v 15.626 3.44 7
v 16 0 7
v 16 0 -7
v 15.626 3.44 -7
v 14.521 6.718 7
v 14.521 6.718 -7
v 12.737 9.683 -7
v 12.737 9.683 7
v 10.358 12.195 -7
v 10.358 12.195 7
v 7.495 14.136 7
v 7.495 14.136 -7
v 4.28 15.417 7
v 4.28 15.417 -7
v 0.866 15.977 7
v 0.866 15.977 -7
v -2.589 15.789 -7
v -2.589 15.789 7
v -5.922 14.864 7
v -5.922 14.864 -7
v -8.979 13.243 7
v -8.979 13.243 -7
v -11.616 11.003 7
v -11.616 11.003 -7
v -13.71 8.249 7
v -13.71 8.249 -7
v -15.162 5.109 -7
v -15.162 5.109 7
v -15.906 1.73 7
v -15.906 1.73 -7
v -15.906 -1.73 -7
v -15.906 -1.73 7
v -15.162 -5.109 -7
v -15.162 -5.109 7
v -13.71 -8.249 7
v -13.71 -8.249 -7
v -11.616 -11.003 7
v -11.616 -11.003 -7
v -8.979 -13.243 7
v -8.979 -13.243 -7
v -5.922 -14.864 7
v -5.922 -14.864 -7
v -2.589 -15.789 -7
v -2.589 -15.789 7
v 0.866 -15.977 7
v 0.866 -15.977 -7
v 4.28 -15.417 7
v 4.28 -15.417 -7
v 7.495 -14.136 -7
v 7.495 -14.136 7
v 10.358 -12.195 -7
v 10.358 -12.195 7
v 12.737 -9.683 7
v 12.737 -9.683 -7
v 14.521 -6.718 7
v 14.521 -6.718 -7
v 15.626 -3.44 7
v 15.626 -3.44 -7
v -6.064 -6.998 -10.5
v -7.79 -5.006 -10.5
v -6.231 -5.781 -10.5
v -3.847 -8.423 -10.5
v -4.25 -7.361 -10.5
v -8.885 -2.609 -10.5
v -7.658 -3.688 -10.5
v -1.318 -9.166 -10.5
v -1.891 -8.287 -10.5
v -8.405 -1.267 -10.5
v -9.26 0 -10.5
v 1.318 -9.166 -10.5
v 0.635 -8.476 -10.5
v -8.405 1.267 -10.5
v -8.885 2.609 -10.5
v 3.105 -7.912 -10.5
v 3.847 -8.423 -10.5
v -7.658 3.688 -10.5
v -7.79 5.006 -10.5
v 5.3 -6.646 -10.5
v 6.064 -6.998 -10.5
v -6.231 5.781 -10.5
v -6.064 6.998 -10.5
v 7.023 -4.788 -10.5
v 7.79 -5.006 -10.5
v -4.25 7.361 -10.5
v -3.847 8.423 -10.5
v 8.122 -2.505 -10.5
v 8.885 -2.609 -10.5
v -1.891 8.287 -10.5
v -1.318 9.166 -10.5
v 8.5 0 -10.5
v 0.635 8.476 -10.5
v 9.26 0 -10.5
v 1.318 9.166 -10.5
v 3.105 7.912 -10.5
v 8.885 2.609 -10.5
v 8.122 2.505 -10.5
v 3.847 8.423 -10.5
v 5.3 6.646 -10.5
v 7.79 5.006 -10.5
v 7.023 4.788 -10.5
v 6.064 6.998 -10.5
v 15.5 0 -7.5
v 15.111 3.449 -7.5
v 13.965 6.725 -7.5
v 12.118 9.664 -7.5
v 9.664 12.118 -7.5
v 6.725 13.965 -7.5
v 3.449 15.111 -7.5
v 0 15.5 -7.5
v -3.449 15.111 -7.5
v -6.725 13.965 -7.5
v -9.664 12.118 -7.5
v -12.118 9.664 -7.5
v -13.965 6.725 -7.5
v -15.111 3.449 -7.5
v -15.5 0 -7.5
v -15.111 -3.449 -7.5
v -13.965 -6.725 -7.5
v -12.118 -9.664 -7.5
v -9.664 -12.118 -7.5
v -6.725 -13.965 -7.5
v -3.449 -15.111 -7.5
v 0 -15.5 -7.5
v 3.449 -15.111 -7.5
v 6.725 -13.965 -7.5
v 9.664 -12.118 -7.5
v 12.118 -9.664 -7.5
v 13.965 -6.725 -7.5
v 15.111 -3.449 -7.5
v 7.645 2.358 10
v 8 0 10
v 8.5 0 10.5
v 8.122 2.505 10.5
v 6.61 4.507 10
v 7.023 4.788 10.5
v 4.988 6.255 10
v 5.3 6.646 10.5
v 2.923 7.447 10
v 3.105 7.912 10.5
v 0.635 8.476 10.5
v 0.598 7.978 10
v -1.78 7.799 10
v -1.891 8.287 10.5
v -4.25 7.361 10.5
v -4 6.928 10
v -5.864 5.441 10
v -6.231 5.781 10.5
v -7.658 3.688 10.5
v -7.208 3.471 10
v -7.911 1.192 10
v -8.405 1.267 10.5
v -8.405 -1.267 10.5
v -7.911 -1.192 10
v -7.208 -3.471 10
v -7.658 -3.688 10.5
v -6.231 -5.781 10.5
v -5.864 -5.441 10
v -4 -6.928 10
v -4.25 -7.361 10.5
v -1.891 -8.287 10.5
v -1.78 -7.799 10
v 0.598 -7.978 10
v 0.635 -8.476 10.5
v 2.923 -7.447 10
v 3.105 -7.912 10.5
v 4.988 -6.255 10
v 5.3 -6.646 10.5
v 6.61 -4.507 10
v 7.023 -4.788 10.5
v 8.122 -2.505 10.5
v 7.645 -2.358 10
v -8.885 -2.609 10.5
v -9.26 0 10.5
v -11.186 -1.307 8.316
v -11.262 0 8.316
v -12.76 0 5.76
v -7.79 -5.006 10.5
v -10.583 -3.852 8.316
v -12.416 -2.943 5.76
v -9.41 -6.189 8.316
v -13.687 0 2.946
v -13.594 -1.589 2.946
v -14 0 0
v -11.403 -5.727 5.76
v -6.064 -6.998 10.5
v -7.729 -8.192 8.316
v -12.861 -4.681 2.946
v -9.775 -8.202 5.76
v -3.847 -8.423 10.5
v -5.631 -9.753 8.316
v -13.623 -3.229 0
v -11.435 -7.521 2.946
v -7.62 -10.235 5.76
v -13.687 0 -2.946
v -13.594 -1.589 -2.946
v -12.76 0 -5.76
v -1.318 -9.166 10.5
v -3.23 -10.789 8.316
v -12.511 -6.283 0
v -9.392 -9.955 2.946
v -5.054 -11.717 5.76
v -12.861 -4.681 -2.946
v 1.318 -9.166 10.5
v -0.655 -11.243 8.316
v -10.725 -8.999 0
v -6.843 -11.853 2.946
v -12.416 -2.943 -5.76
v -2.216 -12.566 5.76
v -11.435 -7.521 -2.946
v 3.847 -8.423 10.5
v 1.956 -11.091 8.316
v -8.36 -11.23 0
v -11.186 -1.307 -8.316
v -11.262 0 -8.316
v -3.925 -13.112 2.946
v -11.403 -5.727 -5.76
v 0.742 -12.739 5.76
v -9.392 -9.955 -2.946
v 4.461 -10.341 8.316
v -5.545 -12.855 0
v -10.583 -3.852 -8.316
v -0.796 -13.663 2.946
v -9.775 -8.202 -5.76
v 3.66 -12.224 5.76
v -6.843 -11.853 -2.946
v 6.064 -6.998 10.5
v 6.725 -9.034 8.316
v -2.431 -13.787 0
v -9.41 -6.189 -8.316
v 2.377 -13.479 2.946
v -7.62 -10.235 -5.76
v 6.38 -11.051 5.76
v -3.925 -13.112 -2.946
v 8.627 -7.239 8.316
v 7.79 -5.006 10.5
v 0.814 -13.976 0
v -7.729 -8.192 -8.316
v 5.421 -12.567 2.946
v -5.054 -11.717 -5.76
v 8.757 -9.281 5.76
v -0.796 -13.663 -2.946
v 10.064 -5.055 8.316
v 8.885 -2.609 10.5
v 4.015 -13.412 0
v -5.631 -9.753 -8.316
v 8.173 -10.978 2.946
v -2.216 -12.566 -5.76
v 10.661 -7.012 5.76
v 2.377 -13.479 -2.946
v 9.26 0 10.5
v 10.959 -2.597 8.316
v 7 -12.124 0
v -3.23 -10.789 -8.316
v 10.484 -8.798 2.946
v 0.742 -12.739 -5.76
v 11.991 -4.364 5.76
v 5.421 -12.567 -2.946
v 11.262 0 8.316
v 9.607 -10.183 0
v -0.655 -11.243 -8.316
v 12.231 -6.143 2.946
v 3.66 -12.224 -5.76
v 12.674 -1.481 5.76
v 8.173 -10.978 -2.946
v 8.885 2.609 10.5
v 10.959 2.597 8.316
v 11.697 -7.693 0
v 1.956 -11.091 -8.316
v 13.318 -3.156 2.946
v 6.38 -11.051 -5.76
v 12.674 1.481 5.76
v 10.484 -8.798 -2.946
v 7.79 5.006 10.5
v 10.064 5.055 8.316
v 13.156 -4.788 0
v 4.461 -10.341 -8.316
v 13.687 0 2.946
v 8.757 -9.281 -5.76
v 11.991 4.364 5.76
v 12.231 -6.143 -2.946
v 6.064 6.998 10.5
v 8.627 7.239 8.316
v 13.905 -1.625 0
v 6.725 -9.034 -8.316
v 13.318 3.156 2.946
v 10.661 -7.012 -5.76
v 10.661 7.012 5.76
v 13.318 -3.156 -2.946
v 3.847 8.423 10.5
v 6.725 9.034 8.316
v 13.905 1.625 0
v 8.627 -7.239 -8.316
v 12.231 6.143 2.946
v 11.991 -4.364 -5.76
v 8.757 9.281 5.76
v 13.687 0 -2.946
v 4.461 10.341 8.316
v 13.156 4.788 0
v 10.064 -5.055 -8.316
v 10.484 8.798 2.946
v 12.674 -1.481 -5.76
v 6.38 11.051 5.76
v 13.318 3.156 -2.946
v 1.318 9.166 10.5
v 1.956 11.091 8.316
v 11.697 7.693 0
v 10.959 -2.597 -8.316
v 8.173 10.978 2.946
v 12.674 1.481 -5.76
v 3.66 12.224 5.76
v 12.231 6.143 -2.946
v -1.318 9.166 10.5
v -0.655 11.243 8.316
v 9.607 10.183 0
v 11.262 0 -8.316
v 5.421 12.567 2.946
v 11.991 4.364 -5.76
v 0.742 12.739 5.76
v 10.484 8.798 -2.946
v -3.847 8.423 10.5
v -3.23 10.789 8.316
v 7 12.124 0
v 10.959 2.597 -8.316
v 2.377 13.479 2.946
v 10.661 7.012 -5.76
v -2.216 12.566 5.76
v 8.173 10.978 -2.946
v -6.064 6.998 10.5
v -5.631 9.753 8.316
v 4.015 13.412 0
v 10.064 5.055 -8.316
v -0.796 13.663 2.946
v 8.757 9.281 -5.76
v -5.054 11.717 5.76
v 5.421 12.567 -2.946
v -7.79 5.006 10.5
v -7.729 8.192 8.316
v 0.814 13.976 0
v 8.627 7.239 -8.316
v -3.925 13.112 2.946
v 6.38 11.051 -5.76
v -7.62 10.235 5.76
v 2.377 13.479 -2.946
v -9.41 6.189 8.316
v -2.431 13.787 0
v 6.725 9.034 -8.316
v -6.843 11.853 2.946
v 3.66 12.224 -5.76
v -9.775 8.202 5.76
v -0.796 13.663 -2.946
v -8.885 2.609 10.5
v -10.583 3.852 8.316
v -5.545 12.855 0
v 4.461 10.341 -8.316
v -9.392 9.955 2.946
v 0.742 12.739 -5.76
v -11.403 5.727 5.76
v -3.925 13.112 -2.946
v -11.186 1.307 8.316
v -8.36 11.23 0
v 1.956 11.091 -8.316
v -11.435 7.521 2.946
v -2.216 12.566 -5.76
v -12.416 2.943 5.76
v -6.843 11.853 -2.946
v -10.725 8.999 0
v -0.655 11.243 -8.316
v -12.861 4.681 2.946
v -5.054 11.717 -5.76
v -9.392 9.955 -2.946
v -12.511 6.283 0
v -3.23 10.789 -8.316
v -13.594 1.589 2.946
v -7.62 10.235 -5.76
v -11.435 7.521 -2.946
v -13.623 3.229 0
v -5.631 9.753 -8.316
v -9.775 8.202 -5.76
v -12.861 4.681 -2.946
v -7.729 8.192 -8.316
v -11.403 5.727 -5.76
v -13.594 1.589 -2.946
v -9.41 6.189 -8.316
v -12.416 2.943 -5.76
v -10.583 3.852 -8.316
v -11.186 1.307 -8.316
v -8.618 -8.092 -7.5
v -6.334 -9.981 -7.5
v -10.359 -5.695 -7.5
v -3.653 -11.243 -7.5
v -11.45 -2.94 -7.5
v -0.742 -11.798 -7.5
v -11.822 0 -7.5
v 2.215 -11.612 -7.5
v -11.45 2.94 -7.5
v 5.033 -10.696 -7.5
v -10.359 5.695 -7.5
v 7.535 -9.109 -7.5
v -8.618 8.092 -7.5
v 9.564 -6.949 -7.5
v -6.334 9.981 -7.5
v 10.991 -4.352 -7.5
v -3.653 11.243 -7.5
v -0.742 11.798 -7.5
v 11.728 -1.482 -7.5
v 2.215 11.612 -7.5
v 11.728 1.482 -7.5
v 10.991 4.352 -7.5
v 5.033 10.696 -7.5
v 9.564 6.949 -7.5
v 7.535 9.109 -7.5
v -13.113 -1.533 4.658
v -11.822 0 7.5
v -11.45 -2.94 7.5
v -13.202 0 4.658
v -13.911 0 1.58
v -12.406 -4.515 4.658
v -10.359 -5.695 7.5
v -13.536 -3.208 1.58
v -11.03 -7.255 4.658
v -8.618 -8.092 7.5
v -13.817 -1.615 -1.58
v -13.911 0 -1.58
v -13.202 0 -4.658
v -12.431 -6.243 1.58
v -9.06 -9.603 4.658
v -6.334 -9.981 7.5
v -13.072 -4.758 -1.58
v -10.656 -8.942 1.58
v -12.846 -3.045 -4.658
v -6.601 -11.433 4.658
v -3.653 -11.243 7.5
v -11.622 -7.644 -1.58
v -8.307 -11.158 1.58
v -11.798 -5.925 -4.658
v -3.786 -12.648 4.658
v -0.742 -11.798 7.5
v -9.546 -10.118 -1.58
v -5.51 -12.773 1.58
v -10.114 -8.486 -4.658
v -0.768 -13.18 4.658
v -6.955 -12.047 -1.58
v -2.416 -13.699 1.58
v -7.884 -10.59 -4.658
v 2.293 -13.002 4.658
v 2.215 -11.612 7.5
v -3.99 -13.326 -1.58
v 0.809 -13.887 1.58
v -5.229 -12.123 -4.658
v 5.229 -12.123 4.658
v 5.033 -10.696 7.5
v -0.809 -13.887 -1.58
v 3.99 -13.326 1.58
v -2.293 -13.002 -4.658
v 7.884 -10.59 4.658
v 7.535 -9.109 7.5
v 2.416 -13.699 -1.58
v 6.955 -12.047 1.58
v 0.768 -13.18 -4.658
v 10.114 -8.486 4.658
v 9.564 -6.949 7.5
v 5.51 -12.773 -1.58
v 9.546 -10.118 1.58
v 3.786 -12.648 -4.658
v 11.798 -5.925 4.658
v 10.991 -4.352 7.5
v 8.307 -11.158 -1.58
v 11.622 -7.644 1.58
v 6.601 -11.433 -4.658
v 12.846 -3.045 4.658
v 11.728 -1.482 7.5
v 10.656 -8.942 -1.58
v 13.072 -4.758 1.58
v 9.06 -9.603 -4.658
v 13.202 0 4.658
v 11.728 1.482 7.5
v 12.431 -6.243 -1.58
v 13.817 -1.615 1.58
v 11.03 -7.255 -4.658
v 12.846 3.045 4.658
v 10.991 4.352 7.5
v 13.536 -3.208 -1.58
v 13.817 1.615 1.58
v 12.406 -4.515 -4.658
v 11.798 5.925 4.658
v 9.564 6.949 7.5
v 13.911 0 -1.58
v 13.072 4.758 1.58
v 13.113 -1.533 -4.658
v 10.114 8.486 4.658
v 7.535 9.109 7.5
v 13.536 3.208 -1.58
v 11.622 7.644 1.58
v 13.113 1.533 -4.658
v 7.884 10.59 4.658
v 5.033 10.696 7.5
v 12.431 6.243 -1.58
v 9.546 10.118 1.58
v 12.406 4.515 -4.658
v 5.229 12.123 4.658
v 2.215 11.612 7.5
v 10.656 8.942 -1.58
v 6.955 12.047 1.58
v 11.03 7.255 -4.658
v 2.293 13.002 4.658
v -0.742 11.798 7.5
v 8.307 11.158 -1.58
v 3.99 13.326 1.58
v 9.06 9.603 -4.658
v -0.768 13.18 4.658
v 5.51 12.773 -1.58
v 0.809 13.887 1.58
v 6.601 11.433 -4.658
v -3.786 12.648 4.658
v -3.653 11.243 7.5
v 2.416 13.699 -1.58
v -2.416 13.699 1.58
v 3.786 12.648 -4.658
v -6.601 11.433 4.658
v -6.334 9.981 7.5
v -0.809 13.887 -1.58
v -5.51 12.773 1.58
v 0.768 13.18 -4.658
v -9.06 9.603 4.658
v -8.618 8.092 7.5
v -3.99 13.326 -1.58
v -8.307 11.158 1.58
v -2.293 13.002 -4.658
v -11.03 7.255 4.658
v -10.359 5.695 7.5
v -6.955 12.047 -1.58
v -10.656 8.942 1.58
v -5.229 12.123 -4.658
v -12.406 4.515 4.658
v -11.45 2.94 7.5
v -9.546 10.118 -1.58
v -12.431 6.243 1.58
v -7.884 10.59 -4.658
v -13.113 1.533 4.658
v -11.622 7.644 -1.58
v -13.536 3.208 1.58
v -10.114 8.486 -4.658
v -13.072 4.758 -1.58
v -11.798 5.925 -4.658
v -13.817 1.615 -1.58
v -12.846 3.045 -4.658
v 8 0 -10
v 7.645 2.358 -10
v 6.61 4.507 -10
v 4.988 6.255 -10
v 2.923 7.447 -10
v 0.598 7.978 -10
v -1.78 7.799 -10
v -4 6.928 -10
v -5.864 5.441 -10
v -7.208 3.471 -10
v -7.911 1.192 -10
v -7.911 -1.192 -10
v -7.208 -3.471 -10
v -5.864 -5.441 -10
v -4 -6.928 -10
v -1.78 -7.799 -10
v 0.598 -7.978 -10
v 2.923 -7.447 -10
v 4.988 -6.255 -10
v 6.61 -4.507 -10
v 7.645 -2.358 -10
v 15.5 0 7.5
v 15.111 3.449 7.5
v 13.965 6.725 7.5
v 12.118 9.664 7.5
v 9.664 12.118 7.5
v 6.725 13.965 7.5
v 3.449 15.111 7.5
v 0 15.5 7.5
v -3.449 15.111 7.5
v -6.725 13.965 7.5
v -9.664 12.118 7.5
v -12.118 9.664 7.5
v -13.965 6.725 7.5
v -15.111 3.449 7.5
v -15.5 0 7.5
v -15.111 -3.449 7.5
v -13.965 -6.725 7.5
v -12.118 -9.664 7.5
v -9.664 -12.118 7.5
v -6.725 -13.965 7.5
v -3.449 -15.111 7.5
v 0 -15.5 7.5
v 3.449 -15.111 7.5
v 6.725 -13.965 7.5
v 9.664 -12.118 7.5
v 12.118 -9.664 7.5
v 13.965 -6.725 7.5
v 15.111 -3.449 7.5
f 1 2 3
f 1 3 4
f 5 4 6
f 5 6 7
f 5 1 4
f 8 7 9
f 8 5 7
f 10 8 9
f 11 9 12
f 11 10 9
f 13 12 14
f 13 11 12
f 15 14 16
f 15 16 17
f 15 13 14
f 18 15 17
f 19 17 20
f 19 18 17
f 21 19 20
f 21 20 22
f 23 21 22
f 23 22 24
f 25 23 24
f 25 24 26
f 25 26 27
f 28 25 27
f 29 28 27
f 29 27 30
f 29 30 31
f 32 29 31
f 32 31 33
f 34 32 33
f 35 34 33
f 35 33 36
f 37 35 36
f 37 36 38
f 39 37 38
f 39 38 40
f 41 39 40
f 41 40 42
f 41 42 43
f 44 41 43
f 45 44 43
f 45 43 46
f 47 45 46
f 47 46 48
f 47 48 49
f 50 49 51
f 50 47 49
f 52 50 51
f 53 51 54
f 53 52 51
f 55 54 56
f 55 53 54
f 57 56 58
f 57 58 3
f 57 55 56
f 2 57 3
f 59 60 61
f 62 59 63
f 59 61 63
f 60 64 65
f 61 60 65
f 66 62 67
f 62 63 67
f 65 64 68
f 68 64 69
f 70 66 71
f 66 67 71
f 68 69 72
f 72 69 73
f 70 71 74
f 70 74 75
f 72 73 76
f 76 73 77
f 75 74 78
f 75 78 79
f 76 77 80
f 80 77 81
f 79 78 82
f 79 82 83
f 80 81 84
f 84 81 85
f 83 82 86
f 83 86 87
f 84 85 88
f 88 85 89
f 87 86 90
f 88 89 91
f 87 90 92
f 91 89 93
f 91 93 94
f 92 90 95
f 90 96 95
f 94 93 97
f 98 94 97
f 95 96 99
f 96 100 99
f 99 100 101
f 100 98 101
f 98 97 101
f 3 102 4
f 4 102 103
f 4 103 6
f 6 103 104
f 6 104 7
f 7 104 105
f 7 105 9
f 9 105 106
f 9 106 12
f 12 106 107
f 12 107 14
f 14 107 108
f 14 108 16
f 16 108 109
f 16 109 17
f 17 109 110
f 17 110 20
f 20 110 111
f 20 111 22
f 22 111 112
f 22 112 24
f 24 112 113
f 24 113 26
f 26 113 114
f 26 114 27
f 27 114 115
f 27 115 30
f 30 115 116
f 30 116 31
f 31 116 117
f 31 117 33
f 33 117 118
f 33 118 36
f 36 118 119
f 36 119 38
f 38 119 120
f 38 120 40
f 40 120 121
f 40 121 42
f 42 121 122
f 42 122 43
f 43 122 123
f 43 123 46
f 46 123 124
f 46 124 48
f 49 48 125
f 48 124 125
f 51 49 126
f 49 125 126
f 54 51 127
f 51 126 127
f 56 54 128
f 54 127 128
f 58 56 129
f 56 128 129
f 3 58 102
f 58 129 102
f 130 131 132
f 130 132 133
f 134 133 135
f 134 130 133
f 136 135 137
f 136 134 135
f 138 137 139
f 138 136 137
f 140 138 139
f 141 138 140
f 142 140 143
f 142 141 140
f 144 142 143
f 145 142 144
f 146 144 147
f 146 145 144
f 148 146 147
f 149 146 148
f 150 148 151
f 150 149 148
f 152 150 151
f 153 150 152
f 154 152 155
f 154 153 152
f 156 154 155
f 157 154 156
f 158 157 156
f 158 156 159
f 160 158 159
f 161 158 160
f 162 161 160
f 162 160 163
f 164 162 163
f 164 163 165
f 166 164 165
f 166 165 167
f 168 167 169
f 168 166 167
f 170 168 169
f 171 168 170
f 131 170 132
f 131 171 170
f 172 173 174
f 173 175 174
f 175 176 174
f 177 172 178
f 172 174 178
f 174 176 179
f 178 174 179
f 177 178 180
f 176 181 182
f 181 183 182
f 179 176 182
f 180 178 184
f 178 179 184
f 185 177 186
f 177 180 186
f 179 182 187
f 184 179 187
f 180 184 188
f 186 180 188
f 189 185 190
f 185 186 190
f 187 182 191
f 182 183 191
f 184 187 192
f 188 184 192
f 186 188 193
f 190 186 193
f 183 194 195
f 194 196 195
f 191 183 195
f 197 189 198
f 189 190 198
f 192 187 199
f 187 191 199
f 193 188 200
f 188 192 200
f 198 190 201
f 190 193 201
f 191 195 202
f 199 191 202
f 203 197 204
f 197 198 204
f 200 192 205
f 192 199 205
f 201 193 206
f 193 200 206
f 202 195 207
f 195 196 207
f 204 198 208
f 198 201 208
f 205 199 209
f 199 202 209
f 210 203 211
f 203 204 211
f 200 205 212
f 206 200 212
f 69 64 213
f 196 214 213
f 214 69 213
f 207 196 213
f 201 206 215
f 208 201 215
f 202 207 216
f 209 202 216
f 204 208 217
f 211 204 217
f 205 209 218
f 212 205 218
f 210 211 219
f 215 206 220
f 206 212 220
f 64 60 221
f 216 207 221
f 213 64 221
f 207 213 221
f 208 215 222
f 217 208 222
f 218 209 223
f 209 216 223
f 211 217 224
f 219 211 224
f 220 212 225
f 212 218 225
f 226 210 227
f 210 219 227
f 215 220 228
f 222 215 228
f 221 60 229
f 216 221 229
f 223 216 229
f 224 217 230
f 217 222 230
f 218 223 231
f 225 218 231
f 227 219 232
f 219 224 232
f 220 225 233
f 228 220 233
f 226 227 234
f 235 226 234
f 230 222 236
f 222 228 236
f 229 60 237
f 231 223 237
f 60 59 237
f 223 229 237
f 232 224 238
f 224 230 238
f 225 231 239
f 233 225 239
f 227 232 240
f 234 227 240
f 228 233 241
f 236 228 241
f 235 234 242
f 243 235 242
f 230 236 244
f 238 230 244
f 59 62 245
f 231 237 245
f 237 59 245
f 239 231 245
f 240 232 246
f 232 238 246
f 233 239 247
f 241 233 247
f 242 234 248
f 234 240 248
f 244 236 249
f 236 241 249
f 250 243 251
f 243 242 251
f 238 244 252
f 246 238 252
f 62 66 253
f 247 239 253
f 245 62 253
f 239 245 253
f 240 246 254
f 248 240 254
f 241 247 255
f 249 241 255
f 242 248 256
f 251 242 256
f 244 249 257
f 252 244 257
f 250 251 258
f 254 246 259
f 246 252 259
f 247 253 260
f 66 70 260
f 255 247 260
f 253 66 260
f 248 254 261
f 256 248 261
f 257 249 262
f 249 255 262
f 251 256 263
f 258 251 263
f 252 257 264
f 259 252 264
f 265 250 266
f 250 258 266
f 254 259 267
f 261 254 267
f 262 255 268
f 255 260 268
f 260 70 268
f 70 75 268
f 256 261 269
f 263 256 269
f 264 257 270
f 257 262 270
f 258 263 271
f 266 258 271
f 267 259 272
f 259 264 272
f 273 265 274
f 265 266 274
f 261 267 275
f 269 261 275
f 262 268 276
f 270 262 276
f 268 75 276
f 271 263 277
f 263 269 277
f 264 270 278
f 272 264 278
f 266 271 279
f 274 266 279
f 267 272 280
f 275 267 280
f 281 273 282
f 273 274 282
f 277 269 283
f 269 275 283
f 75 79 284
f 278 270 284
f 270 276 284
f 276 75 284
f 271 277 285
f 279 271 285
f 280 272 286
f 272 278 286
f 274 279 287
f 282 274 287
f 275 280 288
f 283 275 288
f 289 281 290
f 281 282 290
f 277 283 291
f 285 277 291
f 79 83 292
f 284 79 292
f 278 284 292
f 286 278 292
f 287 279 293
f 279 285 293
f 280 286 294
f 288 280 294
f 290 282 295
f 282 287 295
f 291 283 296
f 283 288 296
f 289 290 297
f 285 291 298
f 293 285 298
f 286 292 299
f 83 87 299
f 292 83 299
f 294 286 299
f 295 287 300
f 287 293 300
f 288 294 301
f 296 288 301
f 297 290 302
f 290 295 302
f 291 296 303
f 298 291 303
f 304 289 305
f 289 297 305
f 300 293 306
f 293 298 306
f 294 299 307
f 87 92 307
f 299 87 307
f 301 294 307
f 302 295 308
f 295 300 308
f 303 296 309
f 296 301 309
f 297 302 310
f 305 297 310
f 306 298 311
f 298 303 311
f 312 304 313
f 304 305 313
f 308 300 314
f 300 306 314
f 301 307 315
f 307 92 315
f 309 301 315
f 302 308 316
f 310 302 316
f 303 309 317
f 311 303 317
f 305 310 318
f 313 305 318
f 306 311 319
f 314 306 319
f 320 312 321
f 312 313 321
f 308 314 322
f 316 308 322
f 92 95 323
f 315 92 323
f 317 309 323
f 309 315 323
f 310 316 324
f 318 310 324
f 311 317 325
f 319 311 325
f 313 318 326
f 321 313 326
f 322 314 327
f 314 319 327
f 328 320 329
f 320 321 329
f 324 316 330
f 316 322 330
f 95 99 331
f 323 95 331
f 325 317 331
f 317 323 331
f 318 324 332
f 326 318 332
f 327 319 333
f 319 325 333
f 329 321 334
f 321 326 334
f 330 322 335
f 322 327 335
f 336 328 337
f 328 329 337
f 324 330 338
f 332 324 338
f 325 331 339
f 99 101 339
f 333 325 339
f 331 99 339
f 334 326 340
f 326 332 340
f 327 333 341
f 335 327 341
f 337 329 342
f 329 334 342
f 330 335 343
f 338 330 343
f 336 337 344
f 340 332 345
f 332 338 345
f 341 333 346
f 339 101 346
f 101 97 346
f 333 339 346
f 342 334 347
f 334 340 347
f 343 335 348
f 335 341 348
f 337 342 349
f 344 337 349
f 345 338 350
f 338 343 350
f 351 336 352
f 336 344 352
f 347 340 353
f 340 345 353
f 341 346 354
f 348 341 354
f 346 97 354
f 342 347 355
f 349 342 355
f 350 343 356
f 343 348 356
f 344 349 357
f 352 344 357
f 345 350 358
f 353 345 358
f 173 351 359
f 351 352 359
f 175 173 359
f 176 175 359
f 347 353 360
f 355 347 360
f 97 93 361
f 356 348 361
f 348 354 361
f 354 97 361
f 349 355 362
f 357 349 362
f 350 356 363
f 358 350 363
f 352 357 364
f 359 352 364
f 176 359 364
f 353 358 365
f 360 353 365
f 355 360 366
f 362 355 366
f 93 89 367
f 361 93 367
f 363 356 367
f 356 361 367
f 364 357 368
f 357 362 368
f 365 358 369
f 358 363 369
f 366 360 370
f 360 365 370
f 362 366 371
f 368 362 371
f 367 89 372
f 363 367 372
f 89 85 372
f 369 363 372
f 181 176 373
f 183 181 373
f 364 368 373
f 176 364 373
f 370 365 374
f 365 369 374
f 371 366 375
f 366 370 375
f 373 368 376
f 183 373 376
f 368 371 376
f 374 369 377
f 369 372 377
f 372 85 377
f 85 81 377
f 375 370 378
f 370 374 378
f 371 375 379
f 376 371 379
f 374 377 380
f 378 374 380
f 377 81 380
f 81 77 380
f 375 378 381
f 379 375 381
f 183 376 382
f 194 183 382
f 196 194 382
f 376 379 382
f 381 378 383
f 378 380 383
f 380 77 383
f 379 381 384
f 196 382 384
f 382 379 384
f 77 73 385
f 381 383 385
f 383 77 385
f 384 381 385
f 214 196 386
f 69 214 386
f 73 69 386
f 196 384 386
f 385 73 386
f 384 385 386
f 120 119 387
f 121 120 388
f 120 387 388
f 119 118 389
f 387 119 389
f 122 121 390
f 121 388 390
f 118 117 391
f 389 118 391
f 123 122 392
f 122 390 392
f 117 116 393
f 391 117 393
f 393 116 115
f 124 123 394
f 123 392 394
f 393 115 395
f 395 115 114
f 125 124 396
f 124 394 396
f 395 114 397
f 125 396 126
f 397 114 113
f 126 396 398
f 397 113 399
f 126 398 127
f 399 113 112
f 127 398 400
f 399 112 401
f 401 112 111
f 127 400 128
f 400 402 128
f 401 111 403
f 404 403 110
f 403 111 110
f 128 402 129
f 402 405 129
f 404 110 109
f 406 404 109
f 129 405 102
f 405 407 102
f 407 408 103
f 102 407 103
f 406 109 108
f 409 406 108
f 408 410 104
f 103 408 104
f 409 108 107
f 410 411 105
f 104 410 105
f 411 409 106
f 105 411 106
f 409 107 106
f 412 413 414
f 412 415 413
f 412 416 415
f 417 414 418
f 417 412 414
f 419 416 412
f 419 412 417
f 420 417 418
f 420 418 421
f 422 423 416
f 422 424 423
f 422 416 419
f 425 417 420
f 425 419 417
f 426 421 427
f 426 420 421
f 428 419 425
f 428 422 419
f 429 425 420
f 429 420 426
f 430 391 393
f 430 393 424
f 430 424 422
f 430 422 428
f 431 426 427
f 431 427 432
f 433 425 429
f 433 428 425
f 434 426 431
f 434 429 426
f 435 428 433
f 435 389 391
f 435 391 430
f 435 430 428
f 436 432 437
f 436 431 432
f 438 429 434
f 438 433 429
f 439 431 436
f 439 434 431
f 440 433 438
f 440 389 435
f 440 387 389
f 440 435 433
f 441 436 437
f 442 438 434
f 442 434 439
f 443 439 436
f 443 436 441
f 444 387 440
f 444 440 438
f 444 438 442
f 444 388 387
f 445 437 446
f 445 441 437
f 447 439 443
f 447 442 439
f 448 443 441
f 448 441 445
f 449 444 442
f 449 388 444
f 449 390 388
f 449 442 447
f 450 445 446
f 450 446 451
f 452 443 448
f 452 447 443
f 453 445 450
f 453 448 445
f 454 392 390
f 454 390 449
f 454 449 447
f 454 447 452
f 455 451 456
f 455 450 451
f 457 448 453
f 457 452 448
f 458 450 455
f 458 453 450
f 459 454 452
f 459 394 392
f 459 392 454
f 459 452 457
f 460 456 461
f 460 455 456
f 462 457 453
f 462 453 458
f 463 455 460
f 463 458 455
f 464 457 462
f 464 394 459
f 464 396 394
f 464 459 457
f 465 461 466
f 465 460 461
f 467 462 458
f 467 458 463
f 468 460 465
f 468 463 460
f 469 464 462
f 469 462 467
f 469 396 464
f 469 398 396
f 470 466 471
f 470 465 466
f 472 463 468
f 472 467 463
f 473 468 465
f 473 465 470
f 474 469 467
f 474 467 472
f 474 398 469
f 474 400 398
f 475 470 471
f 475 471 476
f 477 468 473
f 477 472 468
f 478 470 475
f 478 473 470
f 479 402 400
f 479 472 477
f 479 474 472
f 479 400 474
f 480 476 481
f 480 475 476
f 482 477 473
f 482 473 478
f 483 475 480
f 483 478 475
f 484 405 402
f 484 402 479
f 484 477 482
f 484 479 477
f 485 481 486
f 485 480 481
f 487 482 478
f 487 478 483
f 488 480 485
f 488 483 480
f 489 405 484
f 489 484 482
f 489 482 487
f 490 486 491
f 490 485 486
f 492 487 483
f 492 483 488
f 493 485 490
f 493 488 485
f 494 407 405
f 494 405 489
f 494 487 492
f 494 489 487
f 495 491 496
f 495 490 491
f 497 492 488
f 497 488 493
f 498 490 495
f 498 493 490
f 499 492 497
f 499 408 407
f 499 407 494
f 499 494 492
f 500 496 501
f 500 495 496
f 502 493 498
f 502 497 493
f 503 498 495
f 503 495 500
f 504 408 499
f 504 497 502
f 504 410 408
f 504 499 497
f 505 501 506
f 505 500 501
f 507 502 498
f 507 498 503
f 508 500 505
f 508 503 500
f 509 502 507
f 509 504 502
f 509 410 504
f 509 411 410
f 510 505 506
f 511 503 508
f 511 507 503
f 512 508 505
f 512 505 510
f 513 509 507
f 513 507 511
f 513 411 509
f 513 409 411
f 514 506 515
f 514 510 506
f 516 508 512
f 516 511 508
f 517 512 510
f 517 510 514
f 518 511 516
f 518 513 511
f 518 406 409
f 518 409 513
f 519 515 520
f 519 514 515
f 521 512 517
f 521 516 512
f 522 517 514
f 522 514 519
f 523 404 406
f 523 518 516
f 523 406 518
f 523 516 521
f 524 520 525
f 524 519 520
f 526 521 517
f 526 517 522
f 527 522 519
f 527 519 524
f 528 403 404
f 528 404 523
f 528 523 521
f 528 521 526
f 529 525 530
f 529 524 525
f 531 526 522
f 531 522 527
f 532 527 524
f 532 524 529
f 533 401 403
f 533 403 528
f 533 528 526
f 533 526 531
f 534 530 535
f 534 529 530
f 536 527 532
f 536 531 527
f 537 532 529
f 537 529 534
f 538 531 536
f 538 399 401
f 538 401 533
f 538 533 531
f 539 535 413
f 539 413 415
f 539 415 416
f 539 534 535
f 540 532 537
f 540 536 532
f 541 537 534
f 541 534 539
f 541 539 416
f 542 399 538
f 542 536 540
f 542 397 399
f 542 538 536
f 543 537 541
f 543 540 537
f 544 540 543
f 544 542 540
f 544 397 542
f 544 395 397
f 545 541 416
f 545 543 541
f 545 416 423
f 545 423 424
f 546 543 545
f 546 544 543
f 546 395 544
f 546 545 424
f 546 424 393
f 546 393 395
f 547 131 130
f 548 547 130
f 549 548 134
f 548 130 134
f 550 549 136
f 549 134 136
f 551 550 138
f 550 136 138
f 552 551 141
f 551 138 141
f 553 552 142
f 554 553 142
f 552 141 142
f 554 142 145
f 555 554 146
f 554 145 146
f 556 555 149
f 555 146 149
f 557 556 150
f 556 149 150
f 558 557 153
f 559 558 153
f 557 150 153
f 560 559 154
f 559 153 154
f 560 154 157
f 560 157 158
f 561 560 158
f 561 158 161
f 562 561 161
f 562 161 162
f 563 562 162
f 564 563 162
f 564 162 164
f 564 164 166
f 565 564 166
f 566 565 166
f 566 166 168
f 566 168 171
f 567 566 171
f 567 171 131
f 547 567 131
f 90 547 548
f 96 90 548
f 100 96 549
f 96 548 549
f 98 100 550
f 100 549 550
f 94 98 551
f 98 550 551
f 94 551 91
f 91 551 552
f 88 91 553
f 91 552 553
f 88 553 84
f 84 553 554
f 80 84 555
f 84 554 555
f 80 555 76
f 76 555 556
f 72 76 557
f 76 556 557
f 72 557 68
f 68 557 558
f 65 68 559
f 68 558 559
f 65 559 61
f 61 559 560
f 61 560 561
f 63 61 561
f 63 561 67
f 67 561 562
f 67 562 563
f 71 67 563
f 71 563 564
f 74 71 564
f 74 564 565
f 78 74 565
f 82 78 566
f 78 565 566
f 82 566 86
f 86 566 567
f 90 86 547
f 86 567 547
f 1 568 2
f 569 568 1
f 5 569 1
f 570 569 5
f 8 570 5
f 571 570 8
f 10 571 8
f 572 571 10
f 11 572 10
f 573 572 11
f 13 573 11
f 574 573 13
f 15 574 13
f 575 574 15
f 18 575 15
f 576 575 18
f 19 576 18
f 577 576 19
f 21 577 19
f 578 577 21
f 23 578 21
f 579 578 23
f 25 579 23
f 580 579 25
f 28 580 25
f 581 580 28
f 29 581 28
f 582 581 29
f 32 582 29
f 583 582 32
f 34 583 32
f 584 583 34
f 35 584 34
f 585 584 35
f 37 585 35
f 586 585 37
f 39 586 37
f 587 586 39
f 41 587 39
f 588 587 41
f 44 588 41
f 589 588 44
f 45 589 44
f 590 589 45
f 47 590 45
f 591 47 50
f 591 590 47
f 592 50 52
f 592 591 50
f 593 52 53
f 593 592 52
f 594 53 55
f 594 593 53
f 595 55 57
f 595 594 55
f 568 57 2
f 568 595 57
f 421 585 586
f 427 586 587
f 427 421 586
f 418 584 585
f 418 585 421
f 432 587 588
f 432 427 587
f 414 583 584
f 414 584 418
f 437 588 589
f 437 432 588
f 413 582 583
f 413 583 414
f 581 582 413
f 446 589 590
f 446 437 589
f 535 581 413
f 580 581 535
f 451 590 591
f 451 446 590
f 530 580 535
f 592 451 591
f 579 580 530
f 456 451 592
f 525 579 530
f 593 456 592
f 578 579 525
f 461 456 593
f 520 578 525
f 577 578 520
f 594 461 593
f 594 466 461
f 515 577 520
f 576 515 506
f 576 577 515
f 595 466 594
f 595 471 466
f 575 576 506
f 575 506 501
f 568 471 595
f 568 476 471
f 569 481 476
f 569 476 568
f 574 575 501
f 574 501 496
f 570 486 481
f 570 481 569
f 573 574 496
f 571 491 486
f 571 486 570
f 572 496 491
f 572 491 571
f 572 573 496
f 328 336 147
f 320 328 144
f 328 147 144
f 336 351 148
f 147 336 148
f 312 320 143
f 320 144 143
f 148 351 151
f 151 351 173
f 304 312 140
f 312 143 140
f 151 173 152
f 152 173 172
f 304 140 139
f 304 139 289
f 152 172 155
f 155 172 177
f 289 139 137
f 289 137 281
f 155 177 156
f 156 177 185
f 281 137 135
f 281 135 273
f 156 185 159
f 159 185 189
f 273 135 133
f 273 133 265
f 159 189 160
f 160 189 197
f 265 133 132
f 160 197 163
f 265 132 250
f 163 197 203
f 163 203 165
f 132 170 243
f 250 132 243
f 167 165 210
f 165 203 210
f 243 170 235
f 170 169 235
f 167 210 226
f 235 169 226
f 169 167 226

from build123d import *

# Parameters (mm, degrees)
F0_R          = 16
F1_DEPTH      = 7.5
F5_W          = 45.1367325801
F5_H          = 20.4906001854
F5_W_2        = 40.0436969702
F5_H_2        = 11.4889506178
F6_DEPTH      = 16.001
F6_DEPTH_BACK = 16.001
F7_R          = 8
F8_DEPTH      = 21.001
F9_SIZE       = 0.5
F9_2_SIZE     = 0.5


with BuildPart() as f1:
    # F0 (on Top) → F1 (new body, symmetric)
    with BuildSketch(Plane.XY):
        Circle(F0_R)
    extrude(amount=F1_DEPTH, both=True)

    # F2 (on Front) → F3 (revolve, cut)
    with BuildSketch(Plane.XZ):
        with BuildLine():
            Line((0, -14), (0, 14))
            ThreePointArc((0, 14), (-14, 0), (0, -14))
        make_face()
    revolve(axis=Axis((0, 0, -0.4253866008), (0, 0, 1)), mode=Mode.SUBTRACT)

    # F9#2
    f9_2_edges = [f1.edges().sort_by_distance(p)[0] for p in [
        (-16, 0, -7.5),
        (16, 0, 0),
        (-16, 0, 7.5),
    ]]
    chamfer(f9_2_edges, length=F9_2_SIZE)


with BuildPart() as f4:
    # F2 (on Front) → F4 (revolve)
    with BuildSketch(Plane.XZ):
        with BuildLine():
            Line((0, -14), (0, 14))
            ThreePointArc((0, 14), (-14, 0), (0, -14))
        make_face()
    revolve(axis=Axis((0, 0, -0.4253866008), (0, 0, 1)))

    # F5 (on Front) → F6 (cut, two sides)
    with BuildSketch(Plane.XZ) as f6_sk:
        with Locations((0, 20.7453000927)):
            Rectangle(F5_W, F5_H)
        with Locations((0, -16.2444753089)):
            Rectangle(F5_W_2, F5_H_2)
    extrude(amount=-F6_DEPTH, mode=Mode.SUBTRACT)
    extrude(f6_sk.sketch, amount=F6_DEPTH_BACK, mode=Mode.SUBTRACT)

    # F7 (on face) → F8 (cut, through all)
    with BuildSketch(Plane.XY.offset(10.5)):
        Circle(F7_R)
    extrude(amount=-F8_DEPTH, mode=Mode.SUBTRACT)

    # F9
    f9_edges = [f4.edges().sort_by_distance(p)[0] for p in [
        (-8, 0, 10.5),
        (8, 0, 0),
        (-8, 0, -10.5),
    ]]
    chamfer(f9_edges, length=F9_SIZE)


solid = Compound([f1.part, f4.part])
